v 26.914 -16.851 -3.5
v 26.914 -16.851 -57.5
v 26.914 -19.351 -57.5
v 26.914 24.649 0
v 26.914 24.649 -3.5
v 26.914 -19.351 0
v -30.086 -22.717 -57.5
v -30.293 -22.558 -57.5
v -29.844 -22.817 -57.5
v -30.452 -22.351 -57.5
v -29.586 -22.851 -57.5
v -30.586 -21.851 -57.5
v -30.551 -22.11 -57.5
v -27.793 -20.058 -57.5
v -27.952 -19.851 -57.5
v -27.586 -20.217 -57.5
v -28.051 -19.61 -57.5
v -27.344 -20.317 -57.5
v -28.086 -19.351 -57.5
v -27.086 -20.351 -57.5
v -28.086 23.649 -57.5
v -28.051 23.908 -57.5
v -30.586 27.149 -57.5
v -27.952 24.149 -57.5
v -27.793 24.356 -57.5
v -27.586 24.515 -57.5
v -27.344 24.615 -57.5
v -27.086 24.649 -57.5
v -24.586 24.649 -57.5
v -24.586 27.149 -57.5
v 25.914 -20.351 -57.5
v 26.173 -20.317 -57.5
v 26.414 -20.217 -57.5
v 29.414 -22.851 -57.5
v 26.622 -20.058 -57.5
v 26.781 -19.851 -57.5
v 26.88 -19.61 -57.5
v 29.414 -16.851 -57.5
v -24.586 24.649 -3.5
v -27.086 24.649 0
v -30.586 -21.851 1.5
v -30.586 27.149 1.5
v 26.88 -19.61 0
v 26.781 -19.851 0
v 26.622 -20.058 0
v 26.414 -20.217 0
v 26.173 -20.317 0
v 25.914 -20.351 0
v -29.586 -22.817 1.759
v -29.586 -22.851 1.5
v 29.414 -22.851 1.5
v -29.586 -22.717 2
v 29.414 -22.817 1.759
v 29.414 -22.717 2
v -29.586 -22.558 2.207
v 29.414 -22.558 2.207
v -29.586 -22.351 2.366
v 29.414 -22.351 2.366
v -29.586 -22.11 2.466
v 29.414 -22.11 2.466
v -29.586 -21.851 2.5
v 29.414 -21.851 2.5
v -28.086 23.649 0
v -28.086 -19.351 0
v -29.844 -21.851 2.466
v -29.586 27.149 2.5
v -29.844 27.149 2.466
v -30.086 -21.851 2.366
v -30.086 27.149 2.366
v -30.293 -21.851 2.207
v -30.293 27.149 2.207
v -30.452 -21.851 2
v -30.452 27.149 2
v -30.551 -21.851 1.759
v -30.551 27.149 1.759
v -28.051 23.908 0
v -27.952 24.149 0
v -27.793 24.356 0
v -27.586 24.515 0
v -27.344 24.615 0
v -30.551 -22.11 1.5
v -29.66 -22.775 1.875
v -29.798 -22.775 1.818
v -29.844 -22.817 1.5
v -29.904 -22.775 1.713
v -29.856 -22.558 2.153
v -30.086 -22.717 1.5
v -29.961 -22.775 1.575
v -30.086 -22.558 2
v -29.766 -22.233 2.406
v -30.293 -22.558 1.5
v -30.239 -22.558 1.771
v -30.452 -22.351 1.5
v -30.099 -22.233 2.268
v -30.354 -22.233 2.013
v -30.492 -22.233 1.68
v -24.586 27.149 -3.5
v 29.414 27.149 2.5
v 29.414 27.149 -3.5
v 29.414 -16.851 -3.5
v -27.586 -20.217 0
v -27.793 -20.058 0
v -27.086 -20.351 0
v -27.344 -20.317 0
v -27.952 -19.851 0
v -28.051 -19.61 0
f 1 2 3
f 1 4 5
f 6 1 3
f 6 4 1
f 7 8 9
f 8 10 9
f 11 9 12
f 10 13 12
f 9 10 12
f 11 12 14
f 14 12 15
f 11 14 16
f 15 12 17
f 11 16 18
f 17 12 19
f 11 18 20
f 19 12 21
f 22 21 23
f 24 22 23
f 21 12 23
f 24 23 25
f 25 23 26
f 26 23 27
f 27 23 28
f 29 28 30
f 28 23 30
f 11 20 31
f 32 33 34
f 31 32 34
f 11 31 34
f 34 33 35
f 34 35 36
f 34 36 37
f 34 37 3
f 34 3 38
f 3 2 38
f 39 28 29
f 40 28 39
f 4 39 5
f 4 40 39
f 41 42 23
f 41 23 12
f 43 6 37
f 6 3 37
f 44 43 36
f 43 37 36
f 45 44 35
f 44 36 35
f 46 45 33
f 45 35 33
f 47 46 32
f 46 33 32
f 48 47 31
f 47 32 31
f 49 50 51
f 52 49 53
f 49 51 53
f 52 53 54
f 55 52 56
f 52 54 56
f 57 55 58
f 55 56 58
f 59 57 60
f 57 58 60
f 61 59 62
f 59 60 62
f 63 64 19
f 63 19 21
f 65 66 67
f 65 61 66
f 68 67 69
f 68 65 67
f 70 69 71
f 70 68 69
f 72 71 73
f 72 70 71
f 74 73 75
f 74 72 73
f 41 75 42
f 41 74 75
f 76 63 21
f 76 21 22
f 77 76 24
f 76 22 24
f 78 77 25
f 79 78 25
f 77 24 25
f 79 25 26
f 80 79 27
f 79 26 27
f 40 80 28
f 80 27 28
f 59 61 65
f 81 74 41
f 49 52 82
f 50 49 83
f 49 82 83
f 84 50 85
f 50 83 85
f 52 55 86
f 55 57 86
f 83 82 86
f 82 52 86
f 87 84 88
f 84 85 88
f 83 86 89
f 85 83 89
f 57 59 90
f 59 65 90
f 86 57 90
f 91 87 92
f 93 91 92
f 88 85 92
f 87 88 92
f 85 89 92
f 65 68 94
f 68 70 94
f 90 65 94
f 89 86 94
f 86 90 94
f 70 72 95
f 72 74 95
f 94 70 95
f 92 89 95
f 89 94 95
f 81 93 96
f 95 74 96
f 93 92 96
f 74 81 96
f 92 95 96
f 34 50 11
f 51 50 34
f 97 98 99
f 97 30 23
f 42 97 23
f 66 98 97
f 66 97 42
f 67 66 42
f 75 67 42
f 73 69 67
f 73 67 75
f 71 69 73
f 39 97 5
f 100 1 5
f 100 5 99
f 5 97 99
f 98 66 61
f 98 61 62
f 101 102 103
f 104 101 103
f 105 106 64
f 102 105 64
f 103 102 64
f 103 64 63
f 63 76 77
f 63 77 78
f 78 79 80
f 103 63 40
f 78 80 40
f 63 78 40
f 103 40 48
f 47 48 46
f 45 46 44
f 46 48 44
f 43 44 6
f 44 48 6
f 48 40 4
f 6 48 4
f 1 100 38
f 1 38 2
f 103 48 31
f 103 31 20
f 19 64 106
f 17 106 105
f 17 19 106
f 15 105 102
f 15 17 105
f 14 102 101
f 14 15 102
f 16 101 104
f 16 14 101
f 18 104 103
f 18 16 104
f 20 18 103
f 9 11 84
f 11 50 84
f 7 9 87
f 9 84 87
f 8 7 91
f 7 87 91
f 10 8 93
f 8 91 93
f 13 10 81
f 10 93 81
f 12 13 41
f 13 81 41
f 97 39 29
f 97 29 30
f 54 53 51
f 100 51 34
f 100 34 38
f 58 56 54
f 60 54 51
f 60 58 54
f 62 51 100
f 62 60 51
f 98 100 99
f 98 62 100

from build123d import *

# Parameters (mm, degrees)
F1_DEPTH = 2.5
F2_DEPTH = 57.5
F3_DEPTH = 3.5
F4_R     = 1


with BuildPart() as f1:
    # F0 (on Top) → F1 (new body)
    with BuildSketch(Plane.XY):
        Polygon((26.914498, 24.649286), (-24.585502, 24.649286), (-28.085502, 24.649286), (-28.085502, -20.350714), (26.914498, -20.350714), (26.914498, -16.850714), align=None)
        Polygon((-24.585502, 27.149286), (-30.585502, 27.149286), (-30.585502, -22.850714), (29.414498, -22.850714), (29.414498, -16.850714), (26.914498, -16.850714), (26.914498, -20.350714), (-28.085502, -20.350714), (-28.085502, 24.649286), (-24.585502, 24.649286), align=None)
        Polygon((29.414498, 27.149286), (-24.585502, 27.149286), (-24.585502, 24.649286), (26.914498, 24.649286), (26.914498, -16.850714), (29.414498, -16.850714), align=None)
    extrude(amount=F1_DEPTH)

    # F0 (on Top) → F2 (join)
    with BuildSketch(Plane.XY):
        Polygon((-24.585502, 27.149286), (-30.585502, 27.149286), (-30.585502, -22.850714), (29.414498, -22.850714), (29.414498, -16.850714), (26.914498, -16.850714), (26.914498, -20.350714), (-28.085502, -20.350714), (-28.085502, 24.649286), (-24.585502, 24.649286), align=None)
    extrude(amount=-F2_DEPTH)

    # F0 (on Top) → F3 (join)
    with BuildSketch(Plane.XY):
        Polygon((29.414498, 27.149286), (-24.585502, 27.149286), (-24.585502, 24.649286), (26.914498, 24.649286), (26.914498, -16.850714), (29.414498, -16.850714), align=None)
    extrude(amount=-F3_DEPTH)

    # F4
    f4_edges = [f1.edges().sort_by_distance(p)[0] for p in [
        (-30.585502, 2.149286, 2.5),
        (-0.585502, -22.850714, 2.5),
        (-30.585502, -22.850714, -27.5),
        (-28.085502, -20.350714, -28.75),
        (26.914498, -20.350714, -28.75),
        (-28.085502, 24.649286, -28.75),
    ]]
    fillet(f4_edges, radius=F4_R)


solid = f1.part
